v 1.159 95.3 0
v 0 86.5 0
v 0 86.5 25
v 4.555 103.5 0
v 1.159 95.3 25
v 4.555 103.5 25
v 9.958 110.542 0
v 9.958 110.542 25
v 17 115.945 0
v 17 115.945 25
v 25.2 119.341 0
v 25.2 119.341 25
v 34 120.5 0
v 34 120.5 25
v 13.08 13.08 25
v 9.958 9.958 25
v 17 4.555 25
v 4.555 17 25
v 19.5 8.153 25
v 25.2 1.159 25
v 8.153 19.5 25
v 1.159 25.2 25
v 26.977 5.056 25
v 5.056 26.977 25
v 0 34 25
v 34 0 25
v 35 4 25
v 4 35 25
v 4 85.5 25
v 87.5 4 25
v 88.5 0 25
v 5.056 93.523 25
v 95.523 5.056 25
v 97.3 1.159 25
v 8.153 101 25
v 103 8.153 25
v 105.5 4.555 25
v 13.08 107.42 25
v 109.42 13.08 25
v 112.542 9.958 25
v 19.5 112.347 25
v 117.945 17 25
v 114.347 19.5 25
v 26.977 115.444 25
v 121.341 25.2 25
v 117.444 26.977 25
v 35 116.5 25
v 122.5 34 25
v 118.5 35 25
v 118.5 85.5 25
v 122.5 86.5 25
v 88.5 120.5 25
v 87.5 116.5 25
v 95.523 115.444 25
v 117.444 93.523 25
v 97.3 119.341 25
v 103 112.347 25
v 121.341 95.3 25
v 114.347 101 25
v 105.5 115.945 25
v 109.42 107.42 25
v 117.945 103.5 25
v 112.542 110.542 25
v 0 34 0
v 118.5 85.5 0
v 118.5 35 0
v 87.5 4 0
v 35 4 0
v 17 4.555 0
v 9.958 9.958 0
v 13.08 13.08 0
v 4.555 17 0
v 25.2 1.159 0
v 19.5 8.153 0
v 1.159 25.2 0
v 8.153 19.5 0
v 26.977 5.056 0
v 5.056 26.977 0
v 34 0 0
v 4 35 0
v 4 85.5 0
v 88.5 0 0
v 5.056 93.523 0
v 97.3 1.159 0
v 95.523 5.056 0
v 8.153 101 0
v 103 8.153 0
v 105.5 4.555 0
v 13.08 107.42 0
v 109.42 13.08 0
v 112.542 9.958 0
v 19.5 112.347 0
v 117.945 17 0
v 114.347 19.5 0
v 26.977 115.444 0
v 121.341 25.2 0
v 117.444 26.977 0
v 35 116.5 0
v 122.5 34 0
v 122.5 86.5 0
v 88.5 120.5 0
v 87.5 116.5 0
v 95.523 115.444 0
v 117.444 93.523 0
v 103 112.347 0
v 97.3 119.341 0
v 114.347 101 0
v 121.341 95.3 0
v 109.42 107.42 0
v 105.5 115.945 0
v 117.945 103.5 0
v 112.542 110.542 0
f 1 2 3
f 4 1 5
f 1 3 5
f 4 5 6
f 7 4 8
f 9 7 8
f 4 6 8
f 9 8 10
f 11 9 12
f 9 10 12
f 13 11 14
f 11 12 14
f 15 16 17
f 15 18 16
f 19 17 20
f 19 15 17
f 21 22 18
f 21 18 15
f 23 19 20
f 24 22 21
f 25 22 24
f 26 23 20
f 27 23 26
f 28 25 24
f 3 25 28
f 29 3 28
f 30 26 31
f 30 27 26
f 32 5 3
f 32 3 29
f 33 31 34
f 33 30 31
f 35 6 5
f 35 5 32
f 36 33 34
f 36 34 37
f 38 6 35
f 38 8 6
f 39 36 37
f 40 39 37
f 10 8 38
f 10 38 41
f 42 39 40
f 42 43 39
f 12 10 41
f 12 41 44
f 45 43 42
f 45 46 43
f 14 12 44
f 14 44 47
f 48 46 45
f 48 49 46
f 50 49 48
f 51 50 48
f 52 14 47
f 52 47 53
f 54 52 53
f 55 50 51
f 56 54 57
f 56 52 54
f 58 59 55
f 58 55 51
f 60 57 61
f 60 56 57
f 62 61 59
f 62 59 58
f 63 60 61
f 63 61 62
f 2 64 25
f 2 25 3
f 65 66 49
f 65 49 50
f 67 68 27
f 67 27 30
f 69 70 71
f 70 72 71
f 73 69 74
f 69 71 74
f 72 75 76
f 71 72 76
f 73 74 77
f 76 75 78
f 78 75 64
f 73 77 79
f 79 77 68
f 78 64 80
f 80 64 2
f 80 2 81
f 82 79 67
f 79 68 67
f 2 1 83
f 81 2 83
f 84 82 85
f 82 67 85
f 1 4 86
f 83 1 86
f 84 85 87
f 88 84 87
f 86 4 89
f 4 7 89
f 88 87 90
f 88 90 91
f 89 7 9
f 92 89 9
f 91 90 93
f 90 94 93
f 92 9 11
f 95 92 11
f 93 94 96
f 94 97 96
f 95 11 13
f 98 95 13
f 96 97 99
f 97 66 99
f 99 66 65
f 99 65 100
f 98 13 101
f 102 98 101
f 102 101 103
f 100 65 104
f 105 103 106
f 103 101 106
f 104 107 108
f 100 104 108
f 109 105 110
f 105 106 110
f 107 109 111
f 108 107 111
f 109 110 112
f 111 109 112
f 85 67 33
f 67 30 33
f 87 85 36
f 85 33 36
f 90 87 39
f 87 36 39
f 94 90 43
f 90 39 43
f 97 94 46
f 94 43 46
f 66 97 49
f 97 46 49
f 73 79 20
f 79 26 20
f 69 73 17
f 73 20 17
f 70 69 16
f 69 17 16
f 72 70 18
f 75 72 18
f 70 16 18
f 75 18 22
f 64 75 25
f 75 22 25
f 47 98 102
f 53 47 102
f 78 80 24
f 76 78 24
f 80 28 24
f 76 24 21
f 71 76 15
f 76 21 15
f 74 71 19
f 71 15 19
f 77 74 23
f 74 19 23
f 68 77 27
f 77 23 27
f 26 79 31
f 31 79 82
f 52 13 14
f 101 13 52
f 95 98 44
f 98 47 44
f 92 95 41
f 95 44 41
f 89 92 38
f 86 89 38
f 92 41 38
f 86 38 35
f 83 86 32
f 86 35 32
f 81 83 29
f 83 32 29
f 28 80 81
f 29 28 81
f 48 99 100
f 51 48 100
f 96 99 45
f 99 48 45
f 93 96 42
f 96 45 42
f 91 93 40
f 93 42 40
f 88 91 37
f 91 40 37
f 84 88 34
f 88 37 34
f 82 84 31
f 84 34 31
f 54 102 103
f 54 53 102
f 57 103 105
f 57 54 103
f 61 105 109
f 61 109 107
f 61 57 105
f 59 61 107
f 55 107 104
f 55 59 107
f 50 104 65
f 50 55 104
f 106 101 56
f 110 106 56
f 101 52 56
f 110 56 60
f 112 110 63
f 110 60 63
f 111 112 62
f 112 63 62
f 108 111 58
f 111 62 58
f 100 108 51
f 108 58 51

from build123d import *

# Parameters (mm, degrees)
BOX001_W     = 114.5
BOX001_H     = 112.5
BOX001_DEPTH = 32
BOX_W        = 122.5
BOX_H        = 120.5
BOX_DEPTH    = 25
FILLET_R     = 31
FILLET001_R  = 31
FILLET002_R  = 31
FILLET003_R  = 31
FILLET004_R  = 34
FILLET005_R  = 34
FILLET009_R  = 34
FILLET008_R  = 34


with BuildPart() as cubo001:
    # Box001 → Box001 (new body)
    with BuildSketch(Plane(origin=(4, 4, 0), x_dir=(1, 0, 0), z_dir=(0, 0, 1))):
        with Locations((57.25, 56.25)):
            Rectangle(BOX001_W, BOX001_H)
    extrude(amount=BOX001_DEPTH)


with BuildPart() as fillet008:
    # Box → Box (new body)
    with BuildSketch(Plane.XY):
        with Locations((61.25, 60.25)):
            Rectangle(BOX_W, BOX_H)
    extrude(amount=BOX_DEPTH)

    # Cut: cut Cubo001
    add(cubo001.part, mode=Mode.SUBTRACT)

    # Fillet
    fillet_edges = [fillet008.edges().sort_by_distance(p)[0] for p in [
        (4, 116.5, 12.5),
    ]]
    fillet(fillet_edges, radius=FILLET_R)

    # Fillet001
    fillet001_edges = [fillet008.edges().sort_by_distance(p)[0] for p in [
        (118.5, 116.5, 12.5),
    ]]
    fillet(fillet001_edges, radius=FILLET001_R)

    # Fillet002
    fillet002_edges = [fillet008.edges().sort_by_distance(p)[0] for p in [
        (4, 4, 12.5),
    ]]
    fillet(fillet002_edges, radius=FILLET002_R)

    # Fillet003
    fillet003_edges = [fillet008.edges().sort_by_distance(p)[0] for p in [
        (118.5, 4, 12.5),
    ]]
    fillet(fillet003_edges, radius=FILLET003_R)

    # Fillet004
    fillet004_edges = [fillet008.edges().sort_by_distance(p)[0] for p in [
        (0, 120.5, 12.5),
    ]]
    fillet(fillet004_edges, radius=FILLET004_R)

    # Fillet005
    fillet005_edges = [fillet008.edges().sort_by_distance(p)[0] for p in [
        (122.5, 120.5, 12.5),
    ]]
    fillet(fillet005_edges, radius=FILLET005_R)

    # Fillet009
    fillet009_edges = [fillet008.edges().sort_by_distance(p)[0] for p in [
        (122.5, 0, 12.5),
    ]]
    fillet(fillet009_edges, radius=FILLET009_R)

    # Fillet008
    fillet008_edges = [fillet008.edges().sort_by_distance(p)[0] for p in [
        (0, 0, 12.5),
    ]]
    fillet(fillet008_edges, radius=FILLET008_R)


solid = fillet008.part
